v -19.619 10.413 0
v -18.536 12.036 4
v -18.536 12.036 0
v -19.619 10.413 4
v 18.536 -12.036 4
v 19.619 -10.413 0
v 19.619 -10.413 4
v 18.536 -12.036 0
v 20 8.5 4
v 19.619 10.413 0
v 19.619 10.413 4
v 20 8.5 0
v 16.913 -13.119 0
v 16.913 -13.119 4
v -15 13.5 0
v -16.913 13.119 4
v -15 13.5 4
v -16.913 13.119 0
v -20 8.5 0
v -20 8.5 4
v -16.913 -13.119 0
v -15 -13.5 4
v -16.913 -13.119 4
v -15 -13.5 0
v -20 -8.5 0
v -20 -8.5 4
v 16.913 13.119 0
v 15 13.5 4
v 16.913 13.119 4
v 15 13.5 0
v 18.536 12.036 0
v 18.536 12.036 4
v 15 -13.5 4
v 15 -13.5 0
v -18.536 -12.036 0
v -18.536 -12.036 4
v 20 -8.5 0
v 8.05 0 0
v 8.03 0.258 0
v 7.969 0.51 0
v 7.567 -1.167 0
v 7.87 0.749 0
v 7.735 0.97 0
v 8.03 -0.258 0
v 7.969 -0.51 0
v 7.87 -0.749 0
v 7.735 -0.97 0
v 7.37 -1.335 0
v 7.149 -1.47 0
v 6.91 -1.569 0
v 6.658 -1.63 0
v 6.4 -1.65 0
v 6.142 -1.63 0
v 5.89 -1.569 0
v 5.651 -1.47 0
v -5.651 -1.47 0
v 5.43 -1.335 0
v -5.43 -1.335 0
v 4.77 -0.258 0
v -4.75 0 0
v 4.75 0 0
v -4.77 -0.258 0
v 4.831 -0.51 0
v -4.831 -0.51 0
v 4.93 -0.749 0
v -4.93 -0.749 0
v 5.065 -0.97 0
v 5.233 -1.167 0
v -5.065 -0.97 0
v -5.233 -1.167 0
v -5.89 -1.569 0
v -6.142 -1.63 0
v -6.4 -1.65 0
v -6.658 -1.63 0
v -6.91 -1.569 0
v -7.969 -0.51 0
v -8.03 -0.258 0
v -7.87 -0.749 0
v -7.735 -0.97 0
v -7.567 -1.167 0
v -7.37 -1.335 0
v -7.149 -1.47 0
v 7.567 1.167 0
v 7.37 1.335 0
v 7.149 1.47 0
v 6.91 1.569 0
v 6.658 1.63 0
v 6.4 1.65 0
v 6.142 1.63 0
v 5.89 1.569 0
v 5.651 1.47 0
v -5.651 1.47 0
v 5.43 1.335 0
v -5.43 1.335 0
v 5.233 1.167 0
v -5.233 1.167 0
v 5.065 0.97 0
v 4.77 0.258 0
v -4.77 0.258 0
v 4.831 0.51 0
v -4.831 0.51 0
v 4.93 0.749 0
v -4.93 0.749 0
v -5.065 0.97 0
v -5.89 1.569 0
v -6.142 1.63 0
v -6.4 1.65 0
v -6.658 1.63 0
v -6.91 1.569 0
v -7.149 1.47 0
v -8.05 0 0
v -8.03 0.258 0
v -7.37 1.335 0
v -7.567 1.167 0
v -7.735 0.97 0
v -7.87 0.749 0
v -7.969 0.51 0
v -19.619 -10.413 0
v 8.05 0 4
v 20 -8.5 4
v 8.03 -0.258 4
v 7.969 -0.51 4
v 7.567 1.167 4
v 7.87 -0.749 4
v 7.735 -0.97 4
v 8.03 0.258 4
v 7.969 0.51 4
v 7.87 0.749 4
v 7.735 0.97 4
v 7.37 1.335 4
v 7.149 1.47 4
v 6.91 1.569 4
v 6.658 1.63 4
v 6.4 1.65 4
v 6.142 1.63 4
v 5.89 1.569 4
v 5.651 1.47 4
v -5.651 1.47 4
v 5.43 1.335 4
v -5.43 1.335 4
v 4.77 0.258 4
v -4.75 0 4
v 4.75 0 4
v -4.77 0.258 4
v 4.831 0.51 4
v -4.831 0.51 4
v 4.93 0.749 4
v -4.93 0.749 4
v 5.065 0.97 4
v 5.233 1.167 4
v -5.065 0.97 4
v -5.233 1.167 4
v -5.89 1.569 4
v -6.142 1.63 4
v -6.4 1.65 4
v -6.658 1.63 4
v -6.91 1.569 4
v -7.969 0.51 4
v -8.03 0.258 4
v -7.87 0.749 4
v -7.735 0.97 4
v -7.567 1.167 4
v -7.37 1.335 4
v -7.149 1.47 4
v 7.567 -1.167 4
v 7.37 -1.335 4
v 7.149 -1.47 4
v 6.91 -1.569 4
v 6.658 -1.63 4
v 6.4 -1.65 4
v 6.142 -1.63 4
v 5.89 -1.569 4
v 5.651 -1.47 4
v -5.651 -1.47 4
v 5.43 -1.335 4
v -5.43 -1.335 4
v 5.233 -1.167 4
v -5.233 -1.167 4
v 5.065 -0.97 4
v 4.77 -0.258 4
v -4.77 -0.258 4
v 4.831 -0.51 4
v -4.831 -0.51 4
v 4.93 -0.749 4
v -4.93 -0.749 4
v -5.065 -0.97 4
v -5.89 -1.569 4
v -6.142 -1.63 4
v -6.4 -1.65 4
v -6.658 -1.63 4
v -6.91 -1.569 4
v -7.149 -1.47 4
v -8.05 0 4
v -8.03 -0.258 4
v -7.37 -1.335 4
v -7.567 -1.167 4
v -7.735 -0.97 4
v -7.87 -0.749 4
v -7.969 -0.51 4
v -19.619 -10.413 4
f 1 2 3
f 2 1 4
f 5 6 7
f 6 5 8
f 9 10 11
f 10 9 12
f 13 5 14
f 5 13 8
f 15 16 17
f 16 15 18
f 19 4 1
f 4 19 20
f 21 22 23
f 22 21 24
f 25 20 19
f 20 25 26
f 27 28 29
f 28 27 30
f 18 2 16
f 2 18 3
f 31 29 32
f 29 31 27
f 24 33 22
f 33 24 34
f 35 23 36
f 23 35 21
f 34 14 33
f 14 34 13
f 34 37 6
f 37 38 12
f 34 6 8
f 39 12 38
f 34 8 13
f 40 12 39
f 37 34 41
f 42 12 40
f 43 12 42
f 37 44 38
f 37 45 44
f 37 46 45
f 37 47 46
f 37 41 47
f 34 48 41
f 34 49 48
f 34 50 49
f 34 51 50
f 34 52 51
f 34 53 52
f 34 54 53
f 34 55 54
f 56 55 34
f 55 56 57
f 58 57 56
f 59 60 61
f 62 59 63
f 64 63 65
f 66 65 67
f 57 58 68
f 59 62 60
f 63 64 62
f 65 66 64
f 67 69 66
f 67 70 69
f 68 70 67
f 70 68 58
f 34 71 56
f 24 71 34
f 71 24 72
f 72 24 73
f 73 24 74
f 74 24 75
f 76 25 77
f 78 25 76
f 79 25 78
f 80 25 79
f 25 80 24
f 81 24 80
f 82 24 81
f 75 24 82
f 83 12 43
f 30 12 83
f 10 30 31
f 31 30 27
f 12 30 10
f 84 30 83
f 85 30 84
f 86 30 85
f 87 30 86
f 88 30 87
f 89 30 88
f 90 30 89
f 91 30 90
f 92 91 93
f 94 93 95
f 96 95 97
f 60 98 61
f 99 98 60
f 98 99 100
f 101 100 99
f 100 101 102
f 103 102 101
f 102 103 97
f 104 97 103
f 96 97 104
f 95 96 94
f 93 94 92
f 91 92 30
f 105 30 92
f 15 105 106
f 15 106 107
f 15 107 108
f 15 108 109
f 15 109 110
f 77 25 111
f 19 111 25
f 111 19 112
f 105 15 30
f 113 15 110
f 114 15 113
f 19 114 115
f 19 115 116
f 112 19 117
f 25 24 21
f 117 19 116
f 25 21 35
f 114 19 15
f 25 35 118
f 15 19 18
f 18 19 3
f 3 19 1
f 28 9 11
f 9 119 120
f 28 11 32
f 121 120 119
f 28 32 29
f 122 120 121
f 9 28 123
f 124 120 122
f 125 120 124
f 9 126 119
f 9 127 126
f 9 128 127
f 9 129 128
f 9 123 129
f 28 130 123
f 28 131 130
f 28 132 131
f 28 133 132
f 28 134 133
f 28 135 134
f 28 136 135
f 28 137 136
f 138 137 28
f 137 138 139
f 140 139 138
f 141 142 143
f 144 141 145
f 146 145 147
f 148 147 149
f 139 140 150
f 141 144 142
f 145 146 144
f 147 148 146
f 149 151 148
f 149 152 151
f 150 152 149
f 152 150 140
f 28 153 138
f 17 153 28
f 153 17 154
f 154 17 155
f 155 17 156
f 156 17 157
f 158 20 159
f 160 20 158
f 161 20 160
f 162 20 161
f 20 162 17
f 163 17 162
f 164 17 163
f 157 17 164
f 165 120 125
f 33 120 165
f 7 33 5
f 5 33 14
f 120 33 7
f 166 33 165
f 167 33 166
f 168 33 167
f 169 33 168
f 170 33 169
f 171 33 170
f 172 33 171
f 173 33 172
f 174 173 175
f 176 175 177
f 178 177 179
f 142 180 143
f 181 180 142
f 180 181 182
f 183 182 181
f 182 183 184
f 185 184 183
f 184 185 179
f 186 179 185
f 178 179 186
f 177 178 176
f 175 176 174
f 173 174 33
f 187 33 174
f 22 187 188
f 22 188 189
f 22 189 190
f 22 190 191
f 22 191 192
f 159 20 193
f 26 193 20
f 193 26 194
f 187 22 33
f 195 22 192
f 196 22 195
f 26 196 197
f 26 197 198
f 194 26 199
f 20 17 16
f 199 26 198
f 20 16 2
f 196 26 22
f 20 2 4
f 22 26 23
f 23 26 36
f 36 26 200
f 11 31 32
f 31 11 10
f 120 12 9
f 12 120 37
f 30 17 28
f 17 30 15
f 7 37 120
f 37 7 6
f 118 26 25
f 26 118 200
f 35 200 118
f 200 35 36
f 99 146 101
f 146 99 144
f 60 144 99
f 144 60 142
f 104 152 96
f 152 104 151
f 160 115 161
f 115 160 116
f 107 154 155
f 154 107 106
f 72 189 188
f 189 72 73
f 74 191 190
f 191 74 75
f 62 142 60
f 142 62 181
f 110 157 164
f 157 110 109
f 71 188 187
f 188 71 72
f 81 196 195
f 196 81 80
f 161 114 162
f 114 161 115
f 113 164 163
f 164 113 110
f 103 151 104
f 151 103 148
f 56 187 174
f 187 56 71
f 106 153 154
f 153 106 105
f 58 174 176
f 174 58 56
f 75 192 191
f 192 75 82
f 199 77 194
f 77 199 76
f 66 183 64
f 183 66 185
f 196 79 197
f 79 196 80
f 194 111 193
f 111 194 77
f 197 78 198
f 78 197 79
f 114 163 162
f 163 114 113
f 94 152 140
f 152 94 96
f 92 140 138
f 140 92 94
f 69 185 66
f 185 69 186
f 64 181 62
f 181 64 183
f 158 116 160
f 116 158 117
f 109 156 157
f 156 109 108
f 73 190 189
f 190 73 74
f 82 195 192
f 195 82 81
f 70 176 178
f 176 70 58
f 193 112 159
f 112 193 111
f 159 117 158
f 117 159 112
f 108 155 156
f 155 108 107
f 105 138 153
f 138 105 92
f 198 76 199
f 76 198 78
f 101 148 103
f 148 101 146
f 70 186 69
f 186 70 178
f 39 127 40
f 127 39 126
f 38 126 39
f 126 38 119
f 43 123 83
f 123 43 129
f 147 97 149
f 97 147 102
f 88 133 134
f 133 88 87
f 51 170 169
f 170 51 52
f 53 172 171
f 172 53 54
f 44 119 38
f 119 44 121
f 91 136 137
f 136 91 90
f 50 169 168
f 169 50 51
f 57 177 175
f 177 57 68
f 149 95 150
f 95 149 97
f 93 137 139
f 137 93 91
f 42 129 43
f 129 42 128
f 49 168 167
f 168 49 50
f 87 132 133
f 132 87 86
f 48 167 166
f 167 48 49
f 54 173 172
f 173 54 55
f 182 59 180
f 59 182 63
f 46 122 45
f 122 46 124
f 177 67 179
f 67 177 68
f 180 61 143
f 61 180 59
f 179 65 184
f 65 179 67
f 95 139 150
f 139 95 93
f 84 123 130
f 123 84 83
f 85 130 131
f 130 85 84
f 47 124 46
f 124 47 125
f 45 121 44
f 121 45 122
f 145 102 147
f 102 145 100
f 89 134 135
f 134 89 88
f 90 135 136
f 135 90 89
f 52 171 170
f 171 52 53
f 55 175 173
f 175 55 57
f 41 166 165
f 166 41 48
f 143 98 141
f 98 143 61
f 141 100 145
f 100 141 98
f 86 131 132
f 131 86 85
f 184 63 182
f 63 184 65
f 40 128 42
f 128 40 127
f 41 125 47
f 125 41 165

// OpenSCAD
// =============================================================================
// Plate with mounting holes for KF2EDGWB-3.5 (Degson 3.5 mm pluggable terminal)
// =============================================================================

poles          = 2;    // change this: 2, 3, 4, 5, 6, 8, 10, 12, 16 etc.
hole_diameter  = 3.3;  // slightly larger than 3.2 mm for easy M3 screw or self-tapper
plate_width    = 40;
plate_length   = (poles * 3.5) + 20;  // enough space left/right
plate_thickness = 4;
corner_radius  = 5;

// Distance between the two mounting hole centers (official datasheet value)
hole_spacing = poles * 3.5 + 5.8;

difference() {
    // Main plate with rounded corners
    linear_extrude(plate_thickness)
        offset(r=corner_radius) offset(r=-corner_radius)
            square([plate_width, plate_length], center=true);

    // Left mounting hole
    translate([-hole_spacing/2, 0, -0.1])
        cylinder(h=plate_thickness + 0.2, d=hole_diameter, $fn=40);

    // Right mounting hole
    translate([ hole_spacing/2, 0, -0.1])
        cylinder(h=plate_thickness + 0.2, d=hole_diameter, $fn=40);
}

// Optional: visual reference of the terminal block body (comment out if you don't want it)
%translate([0,0,plate_thickness])
    cube([poles*3.5 + 9.5, 9, 10], center=true);  // approximate body size
